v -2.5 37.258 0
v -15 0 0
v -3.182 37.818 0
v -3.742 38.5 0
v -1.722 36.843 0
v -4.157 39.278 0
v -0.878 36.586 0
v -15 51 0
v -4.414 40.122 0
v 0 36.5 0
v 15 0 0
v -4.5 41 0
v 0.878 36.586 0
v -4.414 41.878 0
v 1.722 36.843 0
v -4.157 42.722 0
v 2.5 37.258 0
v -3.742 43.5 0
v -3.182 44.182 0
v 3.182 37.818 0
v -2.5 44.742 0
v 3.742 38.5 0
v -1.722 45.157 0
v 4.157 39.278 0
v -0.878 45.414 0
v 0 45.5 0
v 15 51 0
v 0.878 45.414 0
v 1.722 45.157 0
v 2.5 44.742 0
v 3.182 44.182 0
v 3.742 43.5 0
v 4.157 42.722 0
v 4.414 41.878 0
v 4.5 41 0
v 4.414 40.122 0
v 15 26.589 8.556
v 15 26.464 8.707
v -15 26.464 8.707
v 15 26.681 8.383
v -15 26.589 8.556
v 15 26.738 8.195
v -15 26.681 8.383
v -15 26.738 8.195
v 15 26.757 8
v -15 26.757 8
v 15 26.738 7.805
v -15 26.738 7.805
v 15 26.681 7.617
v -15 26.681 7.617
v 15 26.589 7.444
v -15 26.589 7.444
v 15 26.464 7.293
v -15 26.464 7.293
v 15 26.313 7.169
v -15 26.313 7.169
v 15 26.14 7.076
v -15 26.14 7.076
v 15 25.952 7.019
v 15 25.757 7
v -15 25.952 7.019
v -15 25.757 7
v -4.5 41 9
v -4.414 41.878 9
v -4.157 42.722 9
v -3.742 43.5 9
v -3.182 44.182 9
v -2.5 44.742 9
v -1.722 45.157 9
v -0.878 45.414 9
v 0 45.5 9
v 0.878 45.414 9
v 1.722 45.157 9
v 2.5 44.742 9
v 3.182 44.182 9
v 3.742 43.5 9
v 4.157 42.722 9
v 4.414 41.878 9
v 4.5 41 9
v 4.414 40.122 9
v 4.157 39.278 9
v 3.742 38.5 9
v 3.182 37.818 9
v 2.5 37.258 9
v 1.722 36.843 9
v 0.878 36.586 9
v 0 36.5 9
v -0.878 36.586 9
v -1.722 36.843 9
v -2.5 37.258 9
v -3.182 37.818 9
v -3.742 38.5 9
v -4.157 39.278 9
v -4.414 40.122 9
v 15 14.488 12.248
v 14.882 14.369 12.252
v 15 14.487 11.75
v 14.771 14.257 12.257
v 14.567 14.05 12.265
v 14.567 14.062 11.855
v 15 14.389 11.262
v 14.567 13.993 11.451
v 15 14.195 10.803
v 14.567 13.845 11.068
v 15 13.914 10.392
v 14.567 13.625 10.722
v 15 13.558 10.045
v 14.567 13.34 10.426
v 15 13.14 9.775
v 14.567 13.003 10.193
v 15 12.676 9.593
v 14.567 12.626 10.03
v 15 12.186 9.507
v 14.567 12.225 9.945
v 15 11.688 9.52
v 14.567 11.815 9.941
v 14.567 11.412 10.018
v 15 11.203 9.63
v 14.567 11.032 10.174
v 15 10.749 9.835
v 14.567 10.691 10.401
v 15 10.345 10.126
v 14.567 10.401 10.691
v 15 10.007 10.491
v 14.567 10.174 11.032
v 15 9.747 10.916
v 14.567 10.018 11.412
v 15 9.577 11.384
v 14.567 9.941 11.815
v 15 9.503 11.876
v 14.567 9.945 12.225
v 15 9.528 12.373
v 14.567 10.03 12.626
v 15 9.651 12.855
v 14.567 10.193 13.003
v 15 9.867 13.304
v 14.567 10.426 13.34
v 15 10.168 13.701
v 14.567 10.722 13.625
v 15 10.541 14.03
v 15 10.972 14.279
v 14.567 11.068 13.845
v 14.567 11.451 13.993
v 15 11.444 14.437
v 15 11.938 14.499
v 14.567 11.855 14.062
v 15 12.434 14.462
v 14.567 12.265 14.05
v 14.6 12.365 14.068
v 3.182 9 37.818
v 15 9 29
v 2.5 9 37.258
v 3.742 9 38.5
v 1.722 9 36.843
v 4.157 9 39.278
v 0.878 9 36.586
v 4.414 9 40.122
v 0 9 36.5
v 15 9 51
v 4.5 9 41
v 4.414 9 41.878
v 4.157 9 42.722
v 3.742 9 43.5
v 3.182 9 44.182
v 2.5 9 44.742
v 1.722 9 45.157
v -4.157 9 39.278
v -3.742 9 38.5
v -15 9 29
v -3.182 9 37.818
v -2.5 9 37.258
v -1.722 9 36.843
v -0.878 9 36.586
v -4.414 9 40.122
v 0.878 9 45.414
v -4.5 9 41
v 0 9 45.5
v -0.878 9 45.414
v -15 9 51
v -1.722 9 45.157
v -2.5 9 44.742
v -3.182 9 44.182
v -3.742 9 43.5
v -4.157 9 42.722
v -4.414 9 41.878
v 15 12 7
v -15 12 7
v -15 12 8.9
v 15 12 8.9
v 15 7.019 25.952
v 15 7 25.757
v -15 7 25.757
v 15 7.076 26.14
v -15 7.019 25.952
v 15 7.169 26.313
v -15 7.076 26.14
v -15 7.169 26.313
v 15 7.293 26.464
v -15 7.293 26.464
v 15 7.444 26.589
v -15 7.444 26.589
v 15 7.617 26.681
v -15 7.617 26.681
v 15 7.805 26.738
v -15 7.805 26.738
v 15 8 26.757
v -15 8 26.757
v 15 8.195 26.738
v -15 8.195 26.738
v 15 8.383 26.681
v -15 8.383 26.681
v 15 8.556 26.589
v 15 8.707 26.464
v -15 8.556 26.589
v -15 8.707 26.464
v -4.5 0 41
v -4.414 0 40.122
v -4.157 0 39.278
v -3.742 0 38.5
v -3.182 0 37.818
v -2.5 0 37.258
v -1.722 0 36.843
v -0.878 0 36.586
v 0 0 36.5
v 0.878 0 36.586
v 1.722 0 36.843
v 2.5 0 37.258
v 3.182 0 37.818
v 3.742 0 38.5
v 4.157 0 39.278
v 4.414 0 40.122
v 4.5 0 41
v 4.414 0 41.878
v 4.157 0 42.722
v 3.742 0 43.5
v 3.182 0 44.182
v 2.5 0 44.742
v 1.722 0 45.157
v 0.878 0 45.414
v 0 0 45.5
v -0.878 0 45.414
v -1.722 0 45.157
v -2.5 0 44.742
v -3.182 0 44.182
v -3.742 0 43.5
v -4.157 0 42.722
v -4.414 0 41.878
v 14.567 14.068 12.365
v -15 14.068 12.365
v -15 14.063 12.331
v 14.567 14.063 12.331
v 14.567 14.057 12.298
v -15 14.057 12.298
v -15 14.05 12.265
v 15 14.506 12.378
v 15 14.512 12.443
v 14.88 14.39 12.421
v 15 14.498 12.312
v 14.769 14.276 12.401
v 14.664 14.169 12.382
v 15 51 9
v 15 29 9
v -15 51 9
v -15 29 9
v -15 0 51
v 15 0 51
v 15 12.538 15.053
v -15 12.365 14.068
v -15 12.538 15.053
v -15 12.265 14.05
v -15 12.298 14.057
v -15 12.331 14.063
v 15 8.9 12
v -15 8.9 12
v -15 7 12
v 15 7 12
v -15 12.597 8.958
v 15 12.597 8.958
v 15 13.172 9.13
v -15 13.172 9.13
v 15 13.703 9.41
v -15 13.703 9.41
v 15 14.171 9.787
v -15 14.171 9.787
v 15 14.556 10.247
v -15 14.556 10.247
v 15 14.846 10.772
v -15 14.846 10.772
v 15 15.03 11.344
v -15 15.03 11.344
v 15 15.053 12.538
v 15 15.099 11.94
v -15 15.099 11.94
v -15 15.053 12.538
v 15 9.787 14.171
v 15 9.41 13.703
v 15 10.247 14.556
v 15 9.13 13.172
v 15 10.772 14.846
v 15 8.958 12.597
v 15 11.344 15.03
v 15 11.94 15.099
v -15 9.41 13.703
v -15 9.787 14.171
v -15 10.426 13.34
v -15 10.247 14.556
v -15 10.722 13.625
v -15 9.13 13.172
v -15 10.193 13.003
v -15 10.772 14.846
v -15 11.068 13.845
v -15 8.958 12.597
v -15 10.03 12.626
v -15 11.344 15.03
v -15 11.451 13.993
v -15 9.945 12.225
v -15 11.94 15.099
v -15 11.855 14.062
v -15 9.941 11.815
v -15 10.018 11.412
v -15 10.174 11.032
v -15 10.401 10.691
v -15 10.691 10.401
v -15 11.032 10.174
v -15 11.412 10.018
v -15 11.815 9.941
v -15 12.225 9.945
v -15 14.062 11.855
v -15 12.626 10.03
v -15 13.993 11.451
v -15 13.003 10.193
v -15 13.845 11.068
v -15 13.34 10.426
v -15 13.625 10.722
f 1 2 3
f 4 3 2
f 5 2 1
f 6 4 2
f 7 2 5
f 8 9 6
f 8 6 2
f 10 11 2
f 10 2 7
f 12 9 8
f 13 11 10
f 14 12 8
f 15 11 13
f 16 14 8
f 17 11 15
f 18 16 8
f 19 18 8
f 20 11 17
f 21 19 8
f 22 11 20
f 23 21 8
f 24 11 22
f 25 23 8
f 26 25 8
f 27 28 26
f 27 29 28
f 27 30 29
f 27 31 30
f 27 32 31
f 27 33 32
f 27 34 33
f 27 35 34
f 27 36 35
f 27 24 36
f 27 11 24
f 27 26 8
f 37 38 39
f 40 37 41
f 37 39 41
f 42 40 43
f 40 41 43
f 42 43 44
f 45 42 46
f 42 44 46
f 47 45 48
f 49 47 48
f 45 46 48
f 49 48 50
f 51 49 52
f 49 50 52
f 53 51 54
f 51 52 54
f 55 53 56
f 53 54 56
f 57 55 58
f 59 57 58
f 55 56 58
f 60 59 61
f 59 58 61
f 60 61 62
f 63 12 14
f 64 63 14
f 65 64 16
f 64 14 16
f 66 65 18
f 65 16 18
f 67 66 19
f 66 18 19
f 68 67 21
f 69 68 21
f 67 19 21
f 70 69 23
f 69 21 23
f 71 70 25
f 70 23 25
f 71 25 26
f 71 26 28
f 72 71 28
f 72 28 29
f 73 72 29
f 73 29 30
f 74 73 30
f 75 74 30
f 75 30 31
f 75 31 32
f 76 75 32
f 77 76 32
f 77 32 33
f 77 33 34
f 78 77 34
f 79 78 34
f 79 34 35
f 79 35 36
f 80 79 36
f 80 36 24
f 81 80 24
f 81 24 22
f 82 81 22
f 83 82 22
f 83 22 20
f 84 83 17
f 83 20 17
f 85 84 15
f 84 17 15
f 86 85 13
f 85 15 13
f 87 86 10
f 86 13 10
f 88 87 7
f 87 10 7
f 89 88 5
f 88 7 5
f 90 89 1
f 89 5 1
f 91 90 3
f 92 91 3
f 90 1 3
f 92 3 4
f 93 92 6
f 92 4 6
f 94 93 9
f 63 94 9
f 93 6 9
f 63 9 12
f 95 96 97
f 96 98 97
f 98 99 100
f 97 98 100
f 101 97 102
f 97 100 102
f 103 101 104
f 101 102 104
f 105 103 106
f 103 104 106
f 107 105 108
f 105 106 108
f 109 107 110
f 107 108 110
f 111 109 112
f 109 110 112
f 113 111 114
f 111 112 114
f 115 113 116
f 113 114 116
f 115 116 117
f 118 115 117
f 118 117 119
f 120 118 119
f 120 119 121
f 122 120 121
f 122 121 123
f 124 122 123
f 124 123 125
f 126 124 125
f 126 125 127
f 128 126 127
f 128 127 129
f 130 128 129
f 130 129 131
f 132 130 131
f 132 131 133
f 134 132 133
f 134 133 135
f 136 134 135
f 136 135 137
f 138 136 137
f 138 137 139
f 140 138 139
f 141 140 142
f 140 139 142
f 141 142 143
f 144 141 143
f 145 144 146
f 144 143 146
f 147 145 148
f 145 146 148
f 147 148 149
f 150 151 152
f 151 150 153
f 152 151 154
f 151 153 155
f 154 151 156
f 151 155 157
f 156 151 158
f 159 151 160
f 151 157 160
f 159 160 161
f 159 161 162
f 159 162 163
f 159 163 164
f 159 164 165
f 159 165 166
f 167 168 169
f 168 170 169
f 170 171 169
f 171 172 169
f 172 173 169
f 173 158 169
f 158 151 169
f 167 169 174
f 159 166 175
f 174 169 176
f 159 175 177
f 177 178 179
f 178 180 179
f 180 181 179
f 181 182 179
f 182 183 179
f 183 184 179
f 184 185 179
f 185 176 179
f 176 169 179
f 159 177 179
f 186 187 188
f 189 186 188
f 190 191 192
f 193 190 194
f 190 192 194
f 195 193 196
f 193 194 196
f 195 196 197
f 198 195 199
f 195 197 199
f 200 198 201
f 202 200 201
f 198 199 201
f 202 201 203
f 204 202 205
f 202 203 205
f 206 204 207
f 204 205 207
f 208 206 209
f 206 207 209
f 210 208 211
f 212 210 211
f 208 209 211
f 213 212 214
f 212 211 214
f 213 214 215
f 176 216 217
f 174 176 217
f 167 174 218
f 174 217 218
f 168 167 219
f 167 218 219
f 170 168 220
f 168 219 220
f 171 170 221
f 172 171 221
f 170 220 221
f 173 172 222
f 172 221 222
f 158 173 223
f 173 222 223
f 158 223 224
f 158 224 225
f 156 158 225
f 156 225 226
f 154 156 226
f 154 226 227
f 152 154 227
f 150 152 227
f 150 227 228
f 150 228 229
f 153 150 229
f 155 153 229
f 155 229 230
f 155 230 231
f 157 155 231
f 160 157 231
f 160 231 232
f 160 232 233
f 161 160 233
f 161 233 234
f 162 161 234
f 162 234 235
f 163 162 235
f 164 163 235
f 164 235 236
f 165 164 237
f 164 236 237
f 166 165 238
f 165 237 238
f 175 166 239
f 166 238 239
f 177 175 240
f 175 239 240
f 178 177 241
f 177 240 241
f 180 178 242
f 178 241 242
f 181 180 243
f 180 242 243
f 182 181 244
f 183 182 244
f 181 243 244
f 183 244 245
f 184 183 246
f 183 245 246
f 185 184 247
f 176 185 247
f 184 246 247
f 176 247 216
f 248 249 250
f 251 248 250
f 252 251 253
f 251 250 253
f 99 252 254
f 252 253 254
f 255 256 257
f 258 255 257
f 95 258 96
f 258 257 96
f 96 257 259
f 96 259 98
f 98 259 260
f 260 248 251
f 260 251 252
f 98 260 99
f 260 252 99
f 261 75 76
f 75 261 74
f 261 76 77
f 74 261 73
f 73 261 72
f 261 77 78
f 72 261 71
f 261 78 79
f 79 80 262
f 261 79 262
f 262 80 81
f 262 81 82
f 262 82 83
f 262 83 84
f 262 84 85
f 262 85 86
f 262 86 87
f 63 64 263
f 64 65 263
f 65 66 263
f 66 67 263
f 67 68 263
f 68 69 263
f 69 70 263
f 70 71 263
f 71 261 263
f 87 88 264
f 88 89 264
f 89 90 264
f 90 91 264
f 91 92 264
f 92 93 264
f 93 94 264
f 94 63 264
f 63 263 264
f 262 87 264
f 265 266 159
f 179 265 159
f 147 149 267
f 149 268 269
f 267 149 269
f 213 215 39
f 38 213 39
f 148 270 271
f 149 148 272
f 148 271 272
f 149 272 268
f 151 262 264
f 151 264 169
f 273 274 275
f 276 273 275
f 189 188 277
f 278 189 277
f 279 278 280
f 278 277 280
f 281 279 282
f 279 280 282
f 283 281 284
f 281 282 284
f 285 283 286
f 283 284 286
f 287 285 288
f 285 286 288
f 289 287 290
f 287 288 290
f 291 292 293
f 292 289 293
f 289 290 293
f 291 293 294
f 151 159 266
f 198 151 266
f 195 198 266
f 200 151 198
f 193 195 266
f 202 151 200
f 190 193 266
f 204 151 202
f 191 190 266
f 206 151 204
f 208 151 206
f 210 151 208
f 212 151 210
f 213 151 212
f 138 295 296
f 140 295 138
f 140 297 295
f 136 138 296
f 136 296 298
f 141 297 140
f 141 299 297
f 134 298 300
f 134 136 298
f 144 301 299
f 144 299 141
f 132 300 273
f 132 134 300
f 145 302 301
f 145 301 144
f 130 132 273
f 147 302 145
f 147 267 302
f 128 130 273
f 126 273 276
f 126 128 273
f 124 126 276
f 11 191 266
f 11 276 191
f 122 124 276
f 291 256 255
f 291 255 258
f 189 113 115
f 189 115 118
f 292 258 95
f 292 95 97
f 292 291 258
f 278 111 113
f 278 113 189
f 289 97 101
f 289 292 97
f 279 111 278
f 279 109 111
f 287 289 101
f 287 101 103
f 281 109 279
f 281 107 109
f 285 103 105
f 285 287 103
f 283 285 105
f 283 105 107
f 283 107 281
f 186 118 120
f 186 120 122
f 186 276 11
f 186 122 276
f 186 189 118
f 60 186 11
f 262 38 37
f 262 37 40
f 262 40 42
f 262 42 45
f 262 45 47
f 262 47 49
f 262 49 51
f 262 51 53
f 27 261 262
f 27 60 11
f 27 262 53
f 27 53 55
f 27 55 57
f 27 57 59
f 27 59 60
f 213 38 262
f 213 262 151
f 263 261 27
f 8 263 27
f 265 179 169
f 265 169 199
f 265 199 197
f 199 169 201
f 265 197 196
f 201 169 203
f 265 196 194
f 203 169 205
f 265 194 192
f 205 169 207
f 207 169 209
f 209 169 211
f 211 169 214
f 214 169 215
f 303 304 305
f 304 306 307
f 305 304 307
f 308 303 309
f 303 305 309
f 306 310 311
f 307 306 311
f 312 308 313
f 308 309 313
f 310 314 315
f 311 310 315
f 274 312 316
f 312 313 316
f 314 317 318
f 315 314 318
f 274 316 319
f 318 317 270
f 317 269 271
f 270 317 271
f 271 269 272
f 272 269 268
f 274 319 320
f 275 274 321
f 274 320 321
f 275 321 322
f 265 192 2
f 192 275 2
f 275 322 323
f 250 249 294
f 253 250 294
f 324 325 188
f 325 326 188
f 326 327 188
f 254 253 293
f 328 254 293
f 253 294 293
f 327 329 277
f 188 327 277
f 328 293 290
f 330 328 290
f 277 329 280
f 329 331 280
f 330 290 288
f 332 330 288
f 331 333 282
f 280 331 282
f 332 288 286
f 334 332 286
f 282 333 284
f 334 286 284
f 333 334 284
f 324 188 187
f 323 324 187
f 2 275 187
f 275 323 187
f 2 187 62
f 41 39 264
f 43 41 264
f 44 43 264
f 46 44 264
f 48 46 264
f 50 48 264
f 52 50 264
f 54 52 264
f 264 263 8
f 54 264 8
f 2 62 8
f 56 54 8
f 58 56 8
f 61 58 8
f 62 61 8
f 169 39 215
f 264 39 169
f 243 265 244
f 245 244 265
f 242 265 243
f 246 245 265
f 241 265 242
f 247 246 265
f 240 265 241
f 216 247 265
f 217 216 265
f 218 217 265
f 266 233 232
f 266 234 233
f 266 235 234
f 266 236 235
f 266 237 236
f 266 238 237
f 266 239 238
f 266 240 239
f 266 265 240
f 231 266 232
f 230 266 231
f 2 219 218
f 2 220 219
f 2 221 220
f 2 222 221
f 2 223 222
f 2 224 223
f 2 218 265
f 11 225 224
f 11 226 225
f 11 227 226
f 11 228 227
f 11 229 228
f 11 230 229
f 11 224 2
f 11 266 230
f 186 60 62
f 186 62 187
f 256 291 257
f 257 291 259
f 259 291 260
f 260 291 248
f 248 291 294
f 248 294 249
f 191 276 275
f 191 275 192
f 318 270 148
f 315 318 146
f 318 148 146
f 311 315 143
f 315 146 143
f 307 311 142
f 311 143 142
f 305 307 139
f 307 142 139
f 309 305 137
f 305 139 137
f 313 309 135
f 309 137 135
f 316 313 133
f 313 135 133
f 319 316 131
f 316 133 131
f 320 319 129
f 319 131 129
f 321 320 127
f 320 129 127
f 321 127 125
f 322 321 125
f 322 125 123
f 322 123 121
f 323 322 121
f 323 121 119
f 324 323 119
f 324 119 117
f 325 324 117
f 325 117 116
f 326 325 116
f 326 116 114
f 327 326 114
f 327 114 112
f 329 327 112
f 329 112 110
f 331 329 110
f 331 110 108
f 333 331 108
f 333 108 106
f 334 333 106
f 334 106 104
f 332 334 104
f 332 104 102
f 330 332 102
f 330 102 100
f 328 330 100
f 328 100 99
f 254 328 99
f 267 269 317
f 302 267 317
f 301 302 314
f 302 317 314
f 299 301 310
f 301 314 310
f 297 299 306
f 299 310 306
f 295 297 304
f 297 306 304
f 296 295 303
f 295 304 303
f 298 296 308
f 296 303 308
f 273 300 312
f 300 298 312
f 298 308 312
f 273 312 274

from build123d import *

# Parameters (mm, degrees)
SKETCH1_W                    = 51
SKETCH1_H                    = 51
BOSS_EXTRUDE1_DEPTH          = 30
CUT_EXTRUDE1_DEPTH           = 31
CUT_EXTRUDE2_DEPTH           = 31
SKETCH4_W                    = 30
SKETCH4_H                    = 2.067
F_9_0_9_DIAMETER_HOLE1_D     = 9
F_9_0_9_DIAMETER_HOLE1_DEPTH = 9
F_9_0_9_DIAMETER_HOLE2_D     = 9
F_9_0_9_DIAMETER_HOLE2_DEPTH = 9
CHAMFER1_SIZE                = 0.433


with BuildPart() as part:
    # Sketch1 → Boss-Extrude1 (new body)
    with BuildSketch(Plane(origin=(15, 0, 0), x_dir=(0, 0, -1), z_dir=(1, 0, 0))):
        with Locations((-25.5, 25.5)):
            Rectangle(SKETCH1_W, SKETCH1_H)
    extrude(amount=-BOSS_EXTRUDE1_DEPTH)

    # Sketch2 → Cut-Extrude1 (cut, through all)
    with BuildSketch(Plane.ZY.offset(15)):
        Polygon((9, 51), (9, 29), (29, 9), (51, 9), (51, 51), align=None)
    extrude(amount=-CUT_EXTRUDE1_DEPTH, mode=Mode.SUBTRACT)

    # Sketch3 → Cut-Extrude2 (cut, through all)
    with BuildSketch(Plane.ZY.offset(15)):
        with BuildLine():
            Line((12, 8.9), (12, 7))
            Line((12, 7), (25.757359313, 7))
            ThreePointArc((25.757359313, 7), (26.681238845, 7.617316568), (26.464466094, 8.707106781))
            Line((26.464466094, 8.707106781), (8.707106781, 26.464466094))
            ThreePointArc((8.707106781, 26.464466094), (7.617316568, 26.681238845), (7, 25.757359313))
            Line((7, 25.757359313), (7, 12))
            Line((7, 12), (8.9, 12))
            ThreePointArc((8.9, 12), (10.00735841, 14.374737774), (12.538309351, 15.052904034))
            Line((12.538309351, 15.052904034), (12.364661173, 14.068096281))
            ThreePointArc((12.364661173, 14.068096281), (11.523597358, 11.523597358), (14.068096281, 12.364661173))
            Line((14.068096281, 12.364661173), (15.052904034, 12.538309351))
            ThreePointArc((15.052904034, 12.538309351), (14.374737774, 10.00735841), (12, 8.9))
        make_face()
    extrude(amount=-CUT_EXTRUDE2_DEPTH, mode=Mode.SUBTRACT)

    # Sketch4 → Cut-Revolve1 (revolve, cut)
    with BuildSketch(Plane.XY.offset(12)):
        with Locations((0, 13.0335)):
            Rectangle(SKETCH4_W, SKETCH4_H)
    revolve(axis=Axis((-15, 12, 12), (1, 0, 0)), mode=Mode.SUBTRACT)

    # Ø9.0 (9) Diameter Hole1
    with Locations(Plane.XY.offset(9)):
        with Locations((0, 41)):
            Hole(F_9_0_9_DIAMETER_HOLE1_D / 2, depth=F_9_0_9_DIAMETER_HOLE1_DEPTH)

    # Ø9.0 (9) Diameter Hole2
    with Locations(Plane(origin=(0, 9, 0), x_dir=(1, 0, 0), z_dir=(0, 1, 0))):
        with Locations((0, -41)):
            Hole(F_9_0_9_DIAMETER_HOLE2_D / 2, depth=F_9_0_9_DIAMETER_HOLE2_DEPTH)

    # Chamfer1
    chamfer1_edges = [part.edges().sort_by_distance(p)[0] for p in [
        (15, 14.059848355, 12.31475481),
        (15, 10.538410283, 10.538410283),
    ]]
    chamfer(chamfer1_edges, length=CHAMFER1_SIZE)


solid = part.part
